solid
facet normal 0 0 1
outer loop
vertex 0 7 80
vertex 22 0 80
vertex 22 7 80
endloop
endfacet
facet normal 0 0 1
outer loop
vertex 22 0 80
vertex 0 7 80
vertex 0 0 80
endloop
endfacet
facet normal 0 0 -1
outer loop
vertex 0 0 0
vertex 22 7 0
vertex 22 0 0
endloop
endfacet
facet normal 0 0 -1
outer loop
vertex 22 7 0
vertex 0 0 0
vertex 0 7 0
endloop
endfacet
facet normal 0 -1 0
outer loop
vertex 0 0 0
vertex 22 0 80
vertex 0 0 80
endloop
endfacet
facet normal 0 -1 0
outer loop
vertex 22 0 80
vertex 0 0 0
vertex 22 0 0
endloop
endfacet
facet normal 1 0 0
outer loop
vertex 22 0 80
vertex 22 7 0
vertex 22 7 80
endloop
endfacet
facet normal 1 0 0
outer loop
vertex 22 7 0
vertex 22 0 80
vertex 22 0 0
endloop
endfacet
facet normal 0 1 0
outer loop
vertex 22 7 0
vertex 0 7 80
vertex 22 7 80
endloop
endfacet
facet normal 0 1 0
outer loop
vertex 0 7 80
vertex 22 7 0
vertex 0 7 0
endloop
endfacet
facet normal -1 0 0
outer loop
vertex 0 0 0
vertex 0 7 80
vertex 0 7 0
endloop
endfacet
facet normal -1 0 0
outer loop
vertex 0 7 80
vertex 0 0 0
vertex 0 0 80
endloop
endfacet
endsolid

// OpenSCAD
/*
 * Prusa MK3S PEI sheet holder
 * (c) 2020 David Mikulik
 * Licensed under 
 *   Creative Commons 
 *   Attribution Non Comercial Share alike license
 */
 
 cube ([22,7,80]);
